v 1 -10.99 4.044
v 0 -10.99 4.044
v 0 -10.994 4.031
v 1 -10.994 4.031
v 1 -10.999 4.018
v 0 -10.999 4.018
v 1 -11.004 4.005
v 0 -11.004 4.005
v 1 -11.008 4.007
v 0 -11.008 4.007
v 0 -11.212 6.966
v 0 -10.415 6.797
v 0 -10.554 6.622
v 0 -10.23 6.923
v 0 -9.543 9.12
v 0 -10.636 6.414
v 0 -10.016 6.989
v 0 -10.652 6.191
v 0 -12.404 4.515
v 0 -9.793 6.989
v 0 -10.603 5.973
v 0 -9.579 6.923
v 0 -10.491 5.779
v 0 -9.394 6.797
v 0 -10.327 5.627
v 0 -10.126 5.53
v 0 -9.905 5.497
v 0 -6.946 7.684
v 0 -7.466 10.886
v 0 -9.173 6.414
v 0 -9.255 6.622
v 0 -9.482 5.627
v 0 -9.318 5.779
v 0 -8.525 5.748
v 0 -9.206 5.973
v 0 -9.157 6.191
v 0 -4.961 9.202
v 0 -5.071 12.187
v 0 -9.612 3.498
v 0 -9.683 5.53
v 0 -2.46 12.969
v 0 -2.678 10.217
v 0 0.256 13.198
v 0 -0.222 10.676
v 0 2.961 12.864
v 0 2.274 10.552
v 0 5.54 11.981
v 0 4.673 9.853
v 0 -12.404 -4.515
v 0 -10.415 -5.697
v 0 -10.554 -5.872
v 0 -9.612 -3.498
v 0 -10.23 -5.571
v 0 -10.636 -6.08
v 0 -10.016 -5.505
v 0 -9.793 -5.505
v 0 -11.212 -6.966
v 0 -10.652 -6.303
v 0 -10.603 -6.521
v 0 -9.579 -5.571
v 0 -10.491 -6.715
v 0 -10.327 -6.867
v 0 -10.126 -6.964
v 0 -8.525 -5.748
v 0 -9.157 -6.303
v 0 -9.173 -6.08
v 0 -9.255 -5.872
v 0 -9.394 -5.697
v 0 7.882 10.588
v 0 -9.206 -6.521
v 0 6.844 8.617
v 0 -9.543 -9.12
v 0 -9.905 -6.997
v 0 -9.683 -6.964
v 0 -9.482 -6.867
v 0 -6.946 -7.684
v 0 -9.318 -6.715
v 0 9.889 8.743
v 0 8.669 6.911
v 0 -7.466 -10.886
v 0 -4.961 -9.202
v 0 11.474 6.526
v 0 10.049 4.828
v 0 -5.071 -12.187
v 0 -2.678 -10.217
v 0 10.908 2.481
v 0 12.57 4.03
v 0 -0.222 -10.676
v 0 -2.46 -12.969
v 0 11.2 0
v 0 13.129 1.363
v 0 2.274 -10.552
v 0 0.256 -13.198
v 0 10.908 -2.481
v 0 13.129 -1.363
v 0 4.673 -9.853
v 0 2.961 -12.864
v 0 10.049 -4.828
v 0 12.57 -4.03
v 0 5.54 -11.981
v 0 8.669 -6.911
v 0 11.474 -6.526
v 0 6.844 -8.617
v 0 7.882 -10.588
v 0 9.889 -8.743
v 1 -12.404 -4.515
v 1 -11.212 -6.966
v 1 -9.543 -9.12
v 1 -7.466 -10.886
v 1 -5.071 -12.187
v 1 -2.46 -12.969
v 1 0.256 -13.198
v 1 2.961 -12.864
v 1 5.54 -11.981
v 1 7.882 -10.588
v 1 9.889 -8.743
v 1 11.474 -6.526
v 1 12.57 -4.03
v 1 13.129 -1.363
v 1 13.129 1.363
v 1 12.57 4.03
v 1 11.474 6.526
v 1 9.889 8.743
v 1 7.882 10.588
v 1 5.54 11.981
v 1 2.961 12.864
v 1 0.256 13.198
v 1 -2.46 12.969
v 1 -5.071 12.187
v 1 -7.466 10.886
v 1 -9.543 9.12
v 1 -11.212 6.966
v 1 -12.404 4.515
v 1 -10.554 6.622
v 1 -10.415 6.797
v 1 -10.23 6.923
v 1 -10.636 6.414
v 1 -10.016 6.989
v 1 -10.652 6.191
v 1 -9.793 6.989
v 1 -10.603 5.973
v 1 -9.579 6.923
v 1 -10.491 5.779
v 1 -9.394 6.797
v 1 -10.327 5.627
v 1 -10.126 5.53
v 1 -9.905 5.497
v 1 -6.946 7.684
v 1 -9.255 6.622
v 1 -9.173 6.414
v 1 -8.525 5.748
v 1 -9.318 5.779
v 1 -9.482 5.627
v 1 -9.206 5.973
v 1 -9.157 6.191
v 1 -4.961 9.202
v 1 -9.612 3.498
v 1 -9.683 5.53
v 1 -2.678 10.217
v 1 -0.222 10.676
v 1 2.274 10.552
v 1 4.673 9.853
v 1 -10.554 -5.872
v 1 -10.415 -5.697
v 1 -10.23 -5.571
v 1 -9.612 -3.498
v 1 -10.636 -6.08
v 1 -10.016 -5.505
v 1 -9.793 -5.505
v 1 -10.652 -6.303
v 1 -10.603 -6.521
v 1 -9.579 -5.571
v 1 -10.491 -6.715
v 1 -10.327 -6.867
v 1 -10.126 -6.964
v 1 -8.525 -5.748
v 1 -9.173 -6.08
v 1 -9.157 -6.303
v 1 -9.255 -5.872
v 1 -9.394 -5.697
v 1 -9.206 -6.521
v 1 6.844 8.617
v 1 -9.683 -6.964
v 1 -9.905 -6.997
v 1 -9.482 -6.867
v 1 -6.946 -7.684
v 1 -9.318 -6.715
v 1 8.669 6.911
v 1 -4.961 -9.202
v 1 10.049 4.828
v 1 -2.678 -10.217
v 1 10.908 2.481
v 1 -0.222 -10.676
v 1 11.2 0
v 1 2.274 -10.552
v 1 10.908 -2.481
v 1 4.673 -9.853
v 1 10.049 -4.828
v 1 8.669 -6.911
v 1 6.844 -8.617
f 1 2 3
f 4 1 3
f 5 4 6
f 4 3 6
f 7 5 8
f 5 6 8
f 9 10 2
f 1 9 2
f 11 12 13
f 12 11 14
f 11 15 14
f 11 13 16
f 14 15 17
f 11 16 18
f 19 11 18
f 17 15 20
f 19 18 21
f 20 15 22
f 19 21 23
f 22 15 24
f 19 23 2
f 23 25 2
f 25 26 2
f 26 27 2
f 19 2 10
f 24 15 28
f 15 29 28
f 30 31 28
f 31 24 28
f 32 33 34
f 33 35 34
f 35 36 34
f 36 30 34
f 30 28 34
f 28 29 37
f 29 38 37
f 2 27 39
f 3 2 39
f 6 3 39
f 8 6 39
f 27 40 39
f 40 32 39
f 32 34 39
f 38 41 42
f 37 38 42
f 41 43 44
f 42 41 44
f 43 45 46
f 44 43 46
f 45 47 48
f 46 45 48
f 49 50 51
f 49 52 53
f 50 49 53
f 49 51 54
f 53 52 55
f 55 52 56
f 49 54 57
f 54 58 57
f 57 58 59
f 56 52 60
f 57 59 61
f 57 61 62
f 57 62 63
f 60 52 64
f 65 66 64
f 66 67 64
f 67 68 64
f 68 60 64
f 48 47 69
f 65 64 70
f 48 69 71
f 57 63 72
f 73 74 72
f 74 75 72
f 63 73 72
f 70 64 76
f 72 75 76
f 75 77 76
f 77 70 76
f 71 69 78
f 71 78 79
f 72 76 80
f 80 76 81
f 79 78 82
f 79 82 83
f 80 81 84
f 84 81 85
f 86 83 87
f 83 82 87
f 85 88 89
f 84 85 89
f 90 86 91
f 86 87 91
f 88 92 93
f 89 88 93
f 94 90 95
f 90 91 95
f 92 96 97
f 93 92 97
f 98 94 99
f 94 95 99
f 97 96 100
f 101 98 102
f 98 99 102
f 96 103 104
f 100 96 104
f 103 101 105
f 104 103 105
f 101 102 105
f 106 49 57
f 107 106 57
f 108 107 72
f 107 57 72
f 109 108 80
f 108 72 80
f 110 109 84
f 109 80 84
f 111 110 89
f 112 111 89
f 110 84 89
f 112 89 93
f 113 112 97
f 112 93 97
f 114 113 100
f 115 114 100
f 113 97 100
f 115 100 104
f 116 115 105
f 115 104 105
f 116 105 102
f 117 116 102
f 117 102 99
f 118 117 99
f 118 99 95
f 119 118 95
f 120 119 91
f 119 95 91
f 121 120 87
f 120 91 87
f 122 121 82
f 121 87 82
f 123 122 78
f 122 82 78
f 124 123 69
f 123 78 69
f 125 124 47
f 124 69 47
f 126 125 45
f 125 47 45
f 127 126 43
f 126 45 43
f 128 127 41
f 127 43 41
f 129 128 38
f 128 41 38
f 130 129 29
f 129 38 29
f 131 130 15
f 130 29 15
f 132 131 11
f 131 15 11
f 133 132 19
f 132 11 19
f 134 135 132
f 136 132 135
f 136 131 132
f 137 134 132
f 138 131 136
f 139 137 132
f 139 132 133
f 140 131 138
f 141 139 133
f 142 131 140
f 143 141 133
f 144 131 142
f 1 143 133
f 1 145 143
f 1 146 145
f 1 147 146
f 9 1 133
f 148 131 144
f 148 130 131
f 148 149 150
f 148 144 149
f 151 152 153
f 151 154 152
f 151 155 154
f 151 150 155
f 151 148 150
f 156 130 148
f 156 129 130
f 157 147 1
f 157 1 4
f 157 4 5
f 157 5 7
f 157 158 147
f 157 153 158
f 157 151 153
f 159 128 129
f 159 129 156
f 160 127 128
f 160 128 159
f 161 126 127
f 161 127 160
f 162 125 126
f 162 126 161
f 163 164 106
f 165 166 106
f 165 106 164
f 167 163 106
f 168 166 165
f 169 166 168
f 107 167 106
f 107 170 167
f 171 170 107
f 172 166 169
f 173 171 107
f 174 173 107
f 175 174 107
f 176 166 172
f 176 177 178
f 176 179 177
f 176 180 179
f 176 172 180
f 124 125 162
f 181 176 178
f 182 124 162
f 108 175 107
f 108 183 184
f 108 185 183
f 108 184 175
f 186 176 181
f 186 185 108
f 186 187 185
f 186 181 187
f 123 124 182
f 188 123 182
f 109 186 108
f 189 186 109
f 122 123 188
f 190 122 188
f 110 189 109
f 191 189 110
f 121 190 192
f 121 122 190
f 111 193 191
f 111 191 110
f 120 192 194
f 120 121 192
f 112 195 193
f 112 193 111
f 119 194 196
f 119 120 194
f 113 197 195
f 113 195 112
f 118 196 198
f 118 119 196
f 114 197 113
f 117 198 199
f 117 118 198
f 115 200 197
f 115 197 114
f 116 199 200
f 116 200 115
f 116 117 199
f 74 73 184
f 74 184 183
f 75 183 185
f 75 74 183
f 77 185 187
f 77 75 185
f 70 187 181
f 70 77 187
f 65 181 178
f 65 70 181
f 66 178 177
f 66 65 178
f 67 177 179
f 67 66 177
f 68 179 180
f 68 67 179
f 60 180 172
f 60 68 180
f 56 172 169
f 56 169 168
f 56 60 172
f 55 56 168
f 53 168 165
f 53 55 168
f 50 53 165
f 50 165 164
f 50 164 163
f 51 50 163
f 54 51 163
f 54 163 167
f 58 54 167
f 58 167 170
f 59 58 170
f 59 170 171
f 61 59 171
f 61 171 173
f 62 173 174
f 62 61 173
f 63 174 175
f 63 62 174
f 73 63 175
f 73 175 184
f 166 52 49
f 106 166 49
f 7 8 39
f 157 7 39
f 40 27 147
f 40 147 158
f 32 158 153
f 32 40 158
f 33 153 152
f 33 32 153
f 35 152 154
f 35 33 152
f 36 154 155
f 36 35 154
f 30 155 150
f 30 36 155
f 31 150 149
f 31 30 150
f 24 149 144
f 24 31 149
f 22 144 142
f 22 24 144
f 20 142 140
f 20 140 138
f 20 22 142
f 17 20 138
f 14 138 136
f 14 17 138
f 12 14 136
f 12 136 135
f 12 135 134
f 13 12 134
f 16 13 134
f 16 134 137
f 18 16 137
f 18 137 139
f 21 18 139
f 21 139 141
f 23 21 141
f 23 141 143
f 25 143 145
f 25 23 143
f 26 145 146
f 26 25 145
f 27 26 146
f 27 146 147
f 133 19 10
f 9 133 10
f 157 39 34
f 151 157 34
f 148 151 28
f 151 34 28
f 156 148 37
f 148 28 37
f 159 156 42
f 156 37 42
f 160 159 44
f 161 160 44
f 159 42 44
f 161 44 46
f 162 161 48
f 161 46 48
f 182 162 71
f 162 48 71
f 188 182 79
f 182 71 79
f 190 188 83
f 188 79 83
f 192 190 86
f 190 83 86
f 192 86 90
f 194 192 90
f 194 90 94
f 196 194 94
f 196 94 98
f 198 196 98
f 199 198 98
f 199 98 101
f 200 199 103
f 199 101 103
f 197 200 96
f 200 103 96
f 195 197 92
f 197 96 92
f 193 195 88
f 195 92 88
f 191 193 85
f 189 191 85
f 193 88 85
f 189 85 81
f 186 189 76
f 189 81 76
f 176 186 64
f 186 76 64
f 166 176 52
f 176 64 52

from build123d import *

# Parameters (mm, degrees)
SZKIC2_R                    = 0.75
DODANIE_WYCI_GNI_CIE1_DEPTH = 1


with BuildPart() as part:
    # Szkic2 → Dodanie-wyciągnięcie1 (new body)
    with BuildSketch(Plane(origin=(0, 0, 0), x_dir=(0, 0, -1), z_dir=(1, 0, 0))):
        with BuildLine():
            Line((-4.005055878, -11.003800589), (-3.498451209, -9.611915701))
            ThreePointArc((-3.498451209, -9.611915701), (0, 11.2), (3.498451209, -9.611915701))
            Line((3.498451209, -9.611915701), (4.514665892, -12.403942594))
            ThreePointArc((4.514665892, -12.403942594), (0, 13.2), (-4.514665892, -12.403942594))
            Line((-4.514665892, -12.403942594), (-4.006558551, -11.007929147))
            Line((-4.006558551, -11.007929147), (-4.043528072, -10.989721595))
            ThreePointArc((-4.043528072, -10.989721595), (-4.024298132, -10.996777916), (-4.005055878, -11.003800589))
        make_face()
        with Locations((-6.246932231, -9.904541267)):
            Circle(SZKIC2_R, mode=Mode.SUBTRACT)
        with Locations((6.24693223, -9.904541267)):
            Circle(SZKIC2_R, mode=Mode.SUBTRACT)
    extrude(amount=DODANIE_WYCI_GNI_CIE1_DEPTH)


solid = part.part
